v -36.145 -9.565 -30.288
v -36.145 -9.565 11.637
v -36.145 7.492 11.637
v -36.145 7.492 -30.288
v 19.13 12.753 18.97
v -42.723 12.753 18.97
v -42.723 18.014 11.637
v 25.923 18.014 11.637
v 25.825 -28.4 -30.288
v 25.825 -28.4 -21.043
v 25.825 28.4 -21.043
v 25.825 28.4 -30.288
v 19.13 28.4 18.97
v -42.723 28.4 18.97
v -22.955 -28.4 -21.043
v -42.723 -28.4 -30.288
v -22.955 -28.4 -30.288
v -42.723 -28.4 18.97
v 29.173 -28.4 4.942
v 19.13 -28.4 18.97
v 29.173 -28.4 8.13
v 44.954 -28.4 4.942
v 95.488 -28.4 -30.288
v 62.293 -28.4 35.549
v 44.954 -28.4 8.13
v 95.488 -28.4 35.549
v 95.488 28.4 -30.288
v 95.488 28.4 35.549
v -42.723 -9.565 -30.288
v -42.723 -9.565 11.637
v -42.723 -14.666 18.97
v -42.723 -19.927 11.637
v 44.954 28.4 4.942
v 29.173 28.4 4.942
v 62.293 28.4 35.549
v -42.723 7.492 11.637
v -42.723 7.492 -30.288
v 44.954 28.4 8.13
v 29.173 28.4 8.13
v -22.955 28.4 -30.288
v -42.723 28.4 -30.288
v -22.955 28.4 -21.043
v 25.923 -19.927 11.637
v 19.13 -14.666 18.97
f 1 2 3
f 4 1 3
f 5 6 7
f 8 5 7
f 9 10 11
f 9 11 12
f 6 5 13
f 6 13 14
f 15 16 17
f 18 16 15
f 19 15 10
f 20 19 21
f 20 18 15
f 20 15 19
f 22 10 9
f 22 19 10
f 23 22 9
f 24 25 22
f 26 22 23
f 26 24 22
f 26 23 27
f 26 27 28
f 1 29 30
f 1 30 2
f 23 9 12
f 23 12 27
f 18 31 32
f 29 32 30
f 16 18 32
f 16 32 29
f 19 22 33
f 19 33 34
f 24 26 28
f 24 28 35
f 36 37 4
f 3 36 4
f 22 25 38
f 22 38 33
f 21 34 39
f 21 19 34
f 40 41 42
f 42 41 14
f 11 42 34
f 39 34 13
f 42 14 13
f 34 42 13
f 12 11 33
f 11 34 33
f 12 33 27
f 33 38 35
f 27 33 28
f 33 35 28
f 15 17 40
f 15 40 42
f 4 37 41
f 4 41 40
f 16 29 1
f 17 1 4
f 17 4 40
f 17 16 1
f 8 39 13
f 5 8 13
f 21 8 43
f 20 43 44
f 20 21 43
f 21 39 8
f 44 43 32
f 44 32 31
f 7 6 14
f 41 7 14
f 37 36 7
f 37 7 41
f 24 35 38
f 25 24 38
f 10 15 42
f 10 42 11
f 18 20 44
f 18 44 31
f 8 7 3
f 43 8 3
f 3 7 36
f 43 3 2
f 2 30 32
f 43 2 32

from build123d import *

# Parameters (mm, degrees)
F1_DEPTH = 28.4
F3_DEPTH = 71.3
F4_W     = 6.577678
F4_H     = 17.057187
F5_DEPTH = 70.5


with BuildPart() as f1:
    # F0 (on Front) → F1 (new body, symmetric)
    with BuildSketch(Plane.XZ):
        Polygon((19.129556, 18.970141), (-42.722672, 18.970141), (-42.722672, -30.288463), (-22.955466, -30.288463), (-22.955466, -21.042513), (25.824901, -21.042513), (25.824901, -30.288463), (54.519232, -30.288463), (95.488362, -30.288463), (95.488362, 35.549089), (62.292963, 35.549089), (44.954456, 8.130061), (44.954456, 4.941802), (29.172573, 4.941802), (29.172573, 8.130061), align=None)
    extrude(amount=F1_DEPTH, both=True)

    # F2 (on face) → F3 (cut)
    with BuildSketch(Plane(origin=(-42.722672, 0, 0), x_dir=(0, -1, 0), z_dir=(-1, 0, 0))):
        Polygon((14.665993, 18.970141), (-12.753037, 18.970141), (-18.013665, 11.637147), (19.926621, 11.637147), align=None)
    extrude(amount=-F3_DEPTH, mode=Mode.SUBTRACT)

    # F4 (on face) → F5 (cut)
    with BuildSketch(Plane.XY.offset(11.637147)):
        with Locations((-39.433833, -1.036185)):
            Rectangle(F4_W, F4_H)
    extrude(amount=-F5_DEPTH, mode=Mode.SUBTRACT)


solid = f1.part
